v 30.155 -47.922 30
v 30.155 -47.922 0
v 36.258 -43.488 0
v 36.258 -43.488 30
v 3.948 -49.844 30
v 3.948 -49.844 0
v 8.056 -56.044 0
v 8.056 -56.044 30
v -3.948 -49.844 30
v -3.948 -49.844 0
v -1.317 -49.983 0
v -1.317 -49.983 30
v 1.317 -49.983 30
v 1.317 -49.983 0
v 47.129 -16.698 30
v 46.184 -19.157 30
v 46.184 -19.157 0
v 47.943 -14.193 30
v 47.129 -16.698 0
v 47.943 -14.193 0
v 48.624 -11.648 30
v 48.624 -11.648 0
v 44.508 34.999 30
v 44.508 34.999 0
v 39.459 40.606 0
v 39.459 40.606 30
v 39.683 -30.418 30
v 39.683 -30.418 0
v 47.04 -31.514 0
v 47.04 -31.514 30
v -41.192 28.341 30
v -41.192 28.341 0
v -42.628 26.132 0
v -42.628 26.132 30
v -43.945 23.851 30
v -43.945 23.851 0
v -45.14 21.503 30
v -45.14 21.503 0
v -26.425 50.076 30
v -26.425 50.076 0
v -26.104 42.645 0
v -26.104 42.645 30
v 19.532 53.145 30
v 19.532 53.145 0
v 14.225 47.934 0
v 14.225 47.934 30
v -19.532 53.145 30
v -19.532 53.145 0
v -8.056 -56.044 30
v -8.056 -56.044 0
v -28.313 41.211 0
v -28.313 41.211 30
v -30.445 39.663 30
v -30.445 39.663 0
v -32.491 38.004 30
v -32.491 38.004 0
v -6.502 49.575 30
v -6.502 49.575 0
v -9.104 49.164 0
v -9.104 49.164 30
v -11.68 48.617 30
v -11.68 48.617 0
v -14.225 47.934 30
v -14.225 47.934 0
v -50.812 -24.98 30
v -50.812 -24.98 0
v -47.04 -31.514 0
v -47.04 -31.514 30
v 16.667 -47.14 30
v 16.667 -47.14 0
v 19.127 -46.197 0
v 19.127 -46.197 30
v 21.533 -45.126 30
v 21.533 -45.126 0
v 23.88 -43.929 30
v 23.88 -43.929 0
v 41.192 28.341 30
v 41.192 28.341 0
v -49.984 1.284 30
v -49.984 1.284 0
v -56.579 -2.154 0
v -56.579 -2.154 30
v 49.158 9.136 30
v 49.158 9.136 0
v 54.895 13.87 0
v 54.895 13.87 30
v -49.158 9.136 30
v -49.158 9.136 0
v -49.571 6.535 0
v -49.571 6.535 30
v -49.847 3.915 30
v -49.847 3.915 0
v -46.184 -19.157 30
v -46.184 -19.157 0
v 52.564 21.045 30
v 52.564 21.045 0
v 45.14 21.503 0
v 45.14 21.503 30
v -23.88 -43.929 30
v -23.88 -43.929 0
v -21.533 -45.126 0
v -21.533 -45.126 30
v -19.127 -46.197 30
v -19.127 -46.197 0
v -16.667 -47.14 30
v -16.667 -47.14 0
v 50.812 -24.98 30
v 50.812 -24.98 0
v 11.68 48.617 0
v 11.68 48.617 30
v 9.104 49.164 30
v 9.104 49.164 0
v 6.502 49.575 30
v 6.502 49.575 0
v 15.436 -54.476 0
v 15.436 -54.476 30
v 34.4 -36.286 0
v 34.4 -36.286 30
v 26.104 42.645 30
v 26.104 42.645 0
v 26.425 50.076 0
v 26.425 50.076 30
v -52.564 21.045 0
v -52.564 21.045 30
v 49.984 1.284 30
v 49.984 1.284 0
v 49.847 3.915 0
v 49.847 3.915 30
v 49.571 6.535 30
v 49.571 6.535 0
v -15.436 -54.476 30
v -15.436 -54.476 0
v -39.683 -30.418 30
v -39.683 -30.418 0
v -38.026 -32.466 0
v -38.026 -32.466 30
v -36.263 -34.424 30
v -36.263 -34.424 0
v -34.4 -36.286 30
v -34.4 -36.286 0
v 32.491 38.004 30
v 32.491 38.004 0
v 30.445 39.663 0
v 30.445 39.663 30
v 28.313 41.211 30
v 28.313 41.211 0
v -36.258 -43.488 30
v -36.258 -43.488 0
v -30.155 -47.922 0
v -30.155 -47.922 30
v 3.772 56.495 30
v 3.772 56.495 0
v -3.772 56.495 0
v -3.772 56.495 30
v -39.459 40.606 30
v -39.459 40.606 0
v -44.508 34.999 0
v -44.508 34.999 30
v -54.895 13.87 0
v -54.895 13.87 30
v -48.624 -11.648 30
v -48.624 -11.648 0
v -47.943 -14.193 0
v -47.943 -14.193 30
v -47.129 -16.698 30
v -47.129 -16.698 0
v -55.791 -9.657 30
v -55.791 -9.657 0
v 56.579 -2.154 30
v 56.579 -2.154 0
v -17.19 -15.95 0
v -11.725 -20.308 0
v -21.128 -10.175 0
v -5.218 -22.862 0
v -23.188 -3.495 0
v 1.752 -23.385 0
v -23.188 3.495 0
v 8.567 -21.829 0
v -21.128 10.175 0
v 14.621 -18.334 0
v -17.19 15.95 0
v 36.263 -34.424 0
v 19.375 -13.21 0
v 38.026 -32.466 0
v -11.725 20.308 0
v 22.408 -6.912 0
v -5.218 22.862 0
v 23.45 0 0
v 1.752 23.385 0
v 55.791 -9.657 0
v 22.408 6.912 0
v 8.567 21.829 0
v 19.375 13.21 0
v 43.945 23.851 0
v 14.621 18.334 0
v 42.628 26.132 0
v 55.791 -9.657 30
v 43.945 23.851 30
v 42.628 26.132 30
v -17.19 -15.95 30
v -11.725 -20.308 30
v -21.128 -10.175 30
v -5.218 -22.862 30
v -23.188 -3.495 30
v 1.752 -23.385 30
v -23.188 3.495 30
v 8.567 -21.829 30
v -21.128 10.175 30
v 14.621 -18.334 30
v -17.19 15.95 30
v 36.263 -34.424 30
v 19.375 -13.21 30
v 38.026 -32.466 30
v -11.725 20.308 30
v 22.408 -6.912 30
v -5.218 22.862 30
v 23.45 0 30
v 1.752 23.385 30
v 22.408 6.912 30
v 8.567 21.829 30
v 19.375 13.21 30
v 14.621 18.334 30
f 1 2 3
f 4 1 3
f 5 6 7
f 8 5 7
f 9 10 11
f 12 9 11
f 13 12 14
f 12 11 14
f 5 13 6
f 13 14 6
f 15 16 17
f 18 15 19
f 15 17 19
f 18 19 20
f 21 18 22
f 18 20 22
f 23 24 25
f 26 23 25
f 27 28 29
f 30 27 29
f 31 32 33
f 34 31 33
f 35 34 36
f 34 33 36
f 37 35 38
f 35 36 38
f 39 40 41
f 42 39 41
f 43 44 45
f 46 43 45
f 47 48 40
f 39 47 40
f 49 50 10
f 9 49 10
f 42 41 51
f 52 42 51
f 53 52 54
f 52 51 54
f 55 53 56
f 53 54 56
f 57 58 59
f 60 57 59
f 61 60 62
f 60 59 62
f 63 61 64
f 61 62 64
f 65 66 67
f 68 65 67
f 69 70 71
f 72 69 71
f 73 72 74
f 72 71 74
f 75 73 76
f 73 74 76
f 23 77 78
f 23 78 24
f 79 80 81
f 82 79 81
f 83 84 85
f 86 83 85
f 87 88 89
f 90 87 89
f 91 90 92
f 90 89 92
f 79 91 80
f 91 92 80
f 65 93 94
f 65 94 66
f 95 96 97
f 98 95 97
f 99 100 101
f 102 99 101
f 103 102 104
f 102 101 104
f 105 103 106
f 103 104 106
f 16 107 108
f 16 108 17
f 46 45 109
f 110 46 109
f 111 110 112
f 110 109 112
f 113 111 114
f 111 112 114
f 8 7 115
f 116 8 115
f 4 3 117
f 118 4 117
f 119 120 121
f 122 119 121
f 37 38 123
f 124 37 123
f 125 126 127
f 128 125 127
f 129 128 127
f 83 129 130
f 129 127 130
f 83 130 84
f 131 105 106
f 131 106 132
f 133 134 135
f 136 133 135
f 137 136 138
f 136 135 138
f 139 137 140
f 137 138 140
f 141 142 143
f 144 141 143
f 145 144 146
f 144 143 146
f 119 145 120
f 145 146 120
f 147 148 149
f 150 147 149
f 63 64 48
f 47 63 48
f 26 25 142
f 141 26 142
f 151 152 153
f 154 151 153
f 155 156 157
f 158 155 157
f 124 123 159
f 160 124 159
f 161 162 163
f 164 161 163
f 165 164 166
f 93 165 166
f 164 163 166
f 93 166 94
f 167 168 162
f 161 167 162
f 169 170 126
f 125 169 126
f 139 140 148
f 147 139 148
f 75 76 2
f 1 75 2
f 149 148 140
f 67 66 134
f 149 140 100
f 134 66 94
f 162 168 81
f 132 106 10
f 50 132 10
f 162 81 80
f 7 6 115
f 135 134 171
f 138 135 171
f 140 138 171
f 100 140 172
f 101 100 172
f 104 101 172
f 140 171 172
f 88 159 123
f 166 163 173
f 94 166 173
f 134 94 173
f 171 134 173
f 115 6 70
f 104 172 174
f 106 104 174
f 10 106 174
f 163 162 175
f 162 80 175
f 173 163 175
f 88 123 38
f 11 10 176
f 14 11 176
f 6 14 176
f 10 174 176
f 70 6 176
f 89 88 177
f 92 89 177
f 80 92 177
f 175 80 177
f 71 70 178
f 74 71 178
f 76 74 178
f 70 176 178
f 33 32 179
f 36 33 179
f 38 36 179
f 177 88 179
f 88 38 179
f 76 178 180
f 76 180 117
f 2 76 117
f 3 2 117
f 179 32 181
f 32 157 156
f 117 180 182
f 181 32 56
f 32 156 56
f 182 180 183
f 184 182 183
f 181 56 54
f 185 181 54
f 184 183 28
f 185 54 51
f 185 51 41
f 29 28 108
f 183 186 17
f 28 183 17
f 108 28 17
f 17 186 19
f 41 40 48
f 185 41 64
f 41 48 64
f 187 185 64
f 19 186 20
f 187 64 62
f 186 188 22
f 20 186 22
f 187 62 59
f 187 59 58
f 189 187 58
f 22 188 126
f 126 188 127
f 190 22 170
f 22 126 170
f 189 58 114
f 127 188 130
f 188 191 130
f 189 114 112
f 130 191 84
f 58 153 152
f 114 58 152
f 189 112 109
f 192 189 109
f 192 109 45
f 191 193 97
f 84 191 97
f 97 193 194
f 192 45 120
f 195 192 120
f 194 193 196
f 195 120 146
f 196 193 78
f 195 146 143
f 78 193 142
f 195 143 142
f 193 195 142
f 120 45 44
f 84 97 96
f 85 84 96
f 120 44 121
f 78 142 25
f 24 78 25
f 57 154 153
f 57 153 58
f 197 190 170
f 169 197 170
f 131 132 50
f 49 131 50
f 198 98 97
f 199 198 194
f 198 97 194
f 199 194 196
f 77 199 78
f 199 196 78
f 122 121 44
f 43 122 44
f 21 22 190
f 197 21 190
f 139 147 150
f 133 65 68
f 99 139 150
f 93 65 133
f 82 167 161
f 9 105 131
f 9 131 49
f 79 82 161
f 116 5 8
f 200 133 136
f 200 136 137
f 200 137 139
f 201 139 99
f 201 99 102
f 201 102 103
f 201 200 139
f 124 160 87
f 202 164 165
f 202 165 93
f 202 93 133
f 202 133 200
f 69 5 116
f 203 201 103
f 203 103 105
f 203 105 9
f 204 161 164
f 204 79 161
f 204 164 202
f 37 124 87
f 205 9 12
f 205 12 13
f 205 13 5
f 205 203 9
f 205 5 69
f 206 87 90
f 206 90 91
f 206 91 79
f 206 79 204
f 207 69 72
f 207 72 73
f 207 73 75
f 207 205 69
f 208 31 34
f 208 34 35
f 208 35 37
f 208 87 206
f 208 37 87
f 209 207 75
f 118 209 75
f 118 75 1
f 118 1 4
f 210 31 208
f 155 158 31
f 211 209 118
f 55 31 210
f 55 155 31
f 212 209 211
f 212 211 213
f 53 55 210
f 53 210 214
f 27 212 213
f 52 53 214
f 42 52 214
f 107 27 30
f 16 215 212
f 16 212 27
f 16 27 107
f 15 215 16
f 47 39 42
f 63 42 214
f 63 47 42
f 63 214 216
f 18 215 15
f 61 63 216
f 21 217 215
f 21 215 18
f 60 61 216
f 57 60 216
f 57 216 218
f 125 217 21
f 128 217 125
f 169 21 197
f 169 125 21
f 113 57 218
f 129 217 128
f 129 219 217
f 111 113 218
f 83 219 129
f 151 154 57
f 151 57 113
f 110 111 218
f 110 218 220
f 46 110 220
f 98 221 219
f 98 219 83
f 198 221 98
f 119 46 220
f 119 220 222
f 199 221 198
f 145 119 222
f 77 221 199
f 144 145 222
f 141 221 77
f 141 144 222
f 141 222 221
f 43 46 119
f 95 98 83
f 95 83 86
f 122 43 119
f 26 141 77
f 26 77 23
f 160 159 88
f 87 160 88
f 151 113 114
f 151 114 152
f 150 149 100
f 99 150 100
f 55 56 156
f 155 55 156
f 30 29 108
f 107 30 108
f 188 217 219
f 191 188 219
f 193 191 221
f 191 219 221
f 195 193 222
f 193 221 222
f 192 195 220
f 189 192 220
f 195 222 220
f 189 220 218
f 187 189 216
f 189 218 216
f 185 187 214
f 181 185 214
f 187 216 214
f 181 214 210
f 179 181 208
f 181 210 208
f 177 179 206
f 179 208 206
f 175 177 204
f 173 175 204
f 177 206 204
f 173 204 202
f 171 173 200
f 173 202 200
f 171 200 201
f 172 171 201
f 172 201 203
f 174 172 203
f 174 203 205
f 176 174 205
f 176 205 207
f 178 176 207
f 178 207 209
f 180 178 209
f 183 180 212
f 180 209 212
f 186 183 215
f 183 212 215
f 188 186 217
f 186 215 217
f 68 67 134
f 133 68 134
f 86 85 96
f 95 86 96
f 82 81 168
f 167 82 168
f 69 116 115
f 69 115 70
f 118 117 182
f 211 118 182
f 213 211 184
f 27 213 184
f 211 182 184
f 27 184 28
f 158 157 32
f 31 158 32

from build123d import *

# Parameters (mm, degrees)
BOSS_EXTRUDE1_DEPTH = 30
SKETCH2_R           = 23.45019305
CUT_EXTRUDE1_DEPTH  = 30


with BuildPart() as part:
    # Sketch1 → Boss-Extrude1 (new body)
    with BuildSketch(Plane.XY):
        with BuildLine():
            Line((6.50170184, 49.57547653), (3.772289399, 56.49452457))
            Line((3.772289399, 56.49452457), (-3.772289399, 56.49452457))
            Line((-3.772289399, 56.49452457), (-6.50170184, 49.57547653))
            ThreePointArc((-6.50170184, 49.57547653), (-10.395584541, 48.907380037), (-14.22456272, 47.933931775))
            Line((-14.22456272, 47.933931775), (-19.532235431, 53.144644629))
            Line((-19.532235431, 53.144644629), (-26.424551121, 50.075987976))
            Line((-26.424551121, 50.075987976), (-26.103763086, 42.644971014))
            ThreePointArc((-26.103763086, 42.644971014), (-29.389262615, 40.450849719), (-32.491271159, 38.00417475))
            Line((-32.491271159, 38.00417475), (-39.459459309, 40.605572828))
            Line((-39.459459309, 40.605572828), (-44.507767895, 34.998858134))
            Line((-44.507767895, 34.998858134), (-41.192246548, 28.340762592))
            ThreePointArc((-41.192246548, 28.340762592), (-43.301270189, 25), (-45.139943641, 21.503150654))
            Line((-45.139943641, 21.503150654), (-52.563784195, 21.045428595))
            Line((-52.563784195, 21.045428595), (-54.895187259, 13.870107767))
            Line((-54.895187259, 13.870107767), (-49.158216363, 9.13617885))
            ThreePointArc((-49.158216363, 9.13617885), (-49.726094768, 5.226423163), (-49.983509784, 1.28403646))
            Line((-49.983509784, 1.28403646), (-56.579353267, -2.153661434))
            Line((-56.579353267, -2.153661434), (-55.790730039, -9.656910239))
            Line((-55.790730039, -9.656910239), (-48.624283981, -11.648133214))
            ThreePointArc((-48.624283981, -11.648133214), (-47.552825815, -15.450849719), (-46.184473, -19.157099304))
            Line((-46.184473, -19.157099304), (-50.811838152, -24.980363835))
            Line((-50.811838152, -24.980363835), (-47.039548753, -31.514160735))
            Line((-47.039548753, -31.514160735), (-39.68277116, -30.418377226))
            ThreePointArc((-39.68277116, -30.418377226), (-37.157241274, -33.456530318), (-34.399721261, -36.285798561))
            Line((-34.399721261, -36.285798561), (-36.258494609, -43.48773439))
            Line((-36.258494609, -43.48773439), (-30.154802146, -47.922326542))
            Line((-30.154802146, -47.922326542), (-23.879746699, -43.929007473))
            ThreePointArc((-23.879746699, -43.929007473), (-20.336832154, -45.677272882), (-16.666945204, -47.1403536))
            Line((-16.666945204, -47.1403536), (-15.43572795, -54.475680595))
            Line((-15.43572795, -54.475680595), (-8.0560163, -56.04428673))
            Line((-8.0560163, -56.04428673), (-3.947697093, -49.843913246))
            ThreePointArc((-3.947697093, -49.843913246), (0, -50), (3.947697093, -49.843913246))
            Line((3.947697093, -49.843913246), (8.056016301, -56.04428673))
            Line((8.056016301, -56.04428673), (15.43572795, -54.475680595))
            Line((15.43572795, -54.475680595), (16.666945204, -47.1403536))
            ThreePointArc((16.666945204, -47.1403536), (20.336832154, -45.677272882), (23.879746699, -43.929007473))
            Line((23.879746699, -43.929007473), (30.154802146, -47.922326542))
            Line((30.154802146, -47.922326542), (36.258494609, -43.48773439))
            Line((36.258494609, -43.48773439), (34.399721261, -36.285798561))
            ThreePointArc((34.399721261, -36.285798561), (37.157241274, -33.456530318), (39.68277116, -30.418377226))
            Line((39.68277116, -30.418377226), (47.039548753, -31.514160735))
            Line((47.039548753, -31.514160735), (50.811838152, -24.980363835))
            Line((50.811838152, -24.980363835), (46.184473, -19.157099304))
            ThreePointArc((46.184473, -19.157099304), (47.552825815, -15.450849719), (48.624283981, -11.648133214))
            Line((48.624283981, -11.648133214), (55.790730039, -9.656910239))
            Line((55.790730039, -9.656910239), (56.579353267, -2.153661433))
            Line((56.579353267, -2.153661433), (49.983509784, 1.28403646))
            ThreePointArc((49.983509784, 1.28403646), (49.726094768, 5.226423163), (49.158216363, 9.13617885))
            Line((49.158216363, 9.13617885), (54.895187259, 13.870107767))
            Line((54.895187259, 13.870107767), (52.563784195, 21.045428595))
            Line((52.563784195, 21.045428595), (45.139943641, 21.503150654))
            ThreePointArc((45.139943641, 21.503150654), (43.301270189, 25), (41.192246548, 28.340762592))
            Line((41.192246548, 28.340762592), (44.507767895, 34.998858134))
            Line((44.507767895, 34.998858134), (39.459459309, 40.605572828))
            Line((39.459459309, 40.605572828), (32.491271159, 38.00417475))
            ThreePointArc((32.491271159, 38.00417475), (29.389262615, 40.450849719), (26.103763086, 42.644971014))
            Line((26.103763086, 42.644971014), (26.424551121, 50.075987976))
            Line((26.424551121, 50.075987976), (19.53223543, 53.144644629))
            Line((19.53223543, 53.144644629), (14.22456272, 47.933931775))
            ThreePointArc((14.22456272, 47.933931775), (10.395584541, 48.907380037), (6.50170184, 49.57547653))
        make_face()
    extrude(amount=BOSS_EXTRUDE1_DEPTH)

    # Sketch2 → Cut-Extrude1 (cut)
    with BuildSketch(Plane.XY.offset(30)):
        Circle(SKETCH2_R)
    extrude(amount=-CUT_EXTRUDE1_DEPTH, mode=Mode.SUBTRACT)


solid = part.part
